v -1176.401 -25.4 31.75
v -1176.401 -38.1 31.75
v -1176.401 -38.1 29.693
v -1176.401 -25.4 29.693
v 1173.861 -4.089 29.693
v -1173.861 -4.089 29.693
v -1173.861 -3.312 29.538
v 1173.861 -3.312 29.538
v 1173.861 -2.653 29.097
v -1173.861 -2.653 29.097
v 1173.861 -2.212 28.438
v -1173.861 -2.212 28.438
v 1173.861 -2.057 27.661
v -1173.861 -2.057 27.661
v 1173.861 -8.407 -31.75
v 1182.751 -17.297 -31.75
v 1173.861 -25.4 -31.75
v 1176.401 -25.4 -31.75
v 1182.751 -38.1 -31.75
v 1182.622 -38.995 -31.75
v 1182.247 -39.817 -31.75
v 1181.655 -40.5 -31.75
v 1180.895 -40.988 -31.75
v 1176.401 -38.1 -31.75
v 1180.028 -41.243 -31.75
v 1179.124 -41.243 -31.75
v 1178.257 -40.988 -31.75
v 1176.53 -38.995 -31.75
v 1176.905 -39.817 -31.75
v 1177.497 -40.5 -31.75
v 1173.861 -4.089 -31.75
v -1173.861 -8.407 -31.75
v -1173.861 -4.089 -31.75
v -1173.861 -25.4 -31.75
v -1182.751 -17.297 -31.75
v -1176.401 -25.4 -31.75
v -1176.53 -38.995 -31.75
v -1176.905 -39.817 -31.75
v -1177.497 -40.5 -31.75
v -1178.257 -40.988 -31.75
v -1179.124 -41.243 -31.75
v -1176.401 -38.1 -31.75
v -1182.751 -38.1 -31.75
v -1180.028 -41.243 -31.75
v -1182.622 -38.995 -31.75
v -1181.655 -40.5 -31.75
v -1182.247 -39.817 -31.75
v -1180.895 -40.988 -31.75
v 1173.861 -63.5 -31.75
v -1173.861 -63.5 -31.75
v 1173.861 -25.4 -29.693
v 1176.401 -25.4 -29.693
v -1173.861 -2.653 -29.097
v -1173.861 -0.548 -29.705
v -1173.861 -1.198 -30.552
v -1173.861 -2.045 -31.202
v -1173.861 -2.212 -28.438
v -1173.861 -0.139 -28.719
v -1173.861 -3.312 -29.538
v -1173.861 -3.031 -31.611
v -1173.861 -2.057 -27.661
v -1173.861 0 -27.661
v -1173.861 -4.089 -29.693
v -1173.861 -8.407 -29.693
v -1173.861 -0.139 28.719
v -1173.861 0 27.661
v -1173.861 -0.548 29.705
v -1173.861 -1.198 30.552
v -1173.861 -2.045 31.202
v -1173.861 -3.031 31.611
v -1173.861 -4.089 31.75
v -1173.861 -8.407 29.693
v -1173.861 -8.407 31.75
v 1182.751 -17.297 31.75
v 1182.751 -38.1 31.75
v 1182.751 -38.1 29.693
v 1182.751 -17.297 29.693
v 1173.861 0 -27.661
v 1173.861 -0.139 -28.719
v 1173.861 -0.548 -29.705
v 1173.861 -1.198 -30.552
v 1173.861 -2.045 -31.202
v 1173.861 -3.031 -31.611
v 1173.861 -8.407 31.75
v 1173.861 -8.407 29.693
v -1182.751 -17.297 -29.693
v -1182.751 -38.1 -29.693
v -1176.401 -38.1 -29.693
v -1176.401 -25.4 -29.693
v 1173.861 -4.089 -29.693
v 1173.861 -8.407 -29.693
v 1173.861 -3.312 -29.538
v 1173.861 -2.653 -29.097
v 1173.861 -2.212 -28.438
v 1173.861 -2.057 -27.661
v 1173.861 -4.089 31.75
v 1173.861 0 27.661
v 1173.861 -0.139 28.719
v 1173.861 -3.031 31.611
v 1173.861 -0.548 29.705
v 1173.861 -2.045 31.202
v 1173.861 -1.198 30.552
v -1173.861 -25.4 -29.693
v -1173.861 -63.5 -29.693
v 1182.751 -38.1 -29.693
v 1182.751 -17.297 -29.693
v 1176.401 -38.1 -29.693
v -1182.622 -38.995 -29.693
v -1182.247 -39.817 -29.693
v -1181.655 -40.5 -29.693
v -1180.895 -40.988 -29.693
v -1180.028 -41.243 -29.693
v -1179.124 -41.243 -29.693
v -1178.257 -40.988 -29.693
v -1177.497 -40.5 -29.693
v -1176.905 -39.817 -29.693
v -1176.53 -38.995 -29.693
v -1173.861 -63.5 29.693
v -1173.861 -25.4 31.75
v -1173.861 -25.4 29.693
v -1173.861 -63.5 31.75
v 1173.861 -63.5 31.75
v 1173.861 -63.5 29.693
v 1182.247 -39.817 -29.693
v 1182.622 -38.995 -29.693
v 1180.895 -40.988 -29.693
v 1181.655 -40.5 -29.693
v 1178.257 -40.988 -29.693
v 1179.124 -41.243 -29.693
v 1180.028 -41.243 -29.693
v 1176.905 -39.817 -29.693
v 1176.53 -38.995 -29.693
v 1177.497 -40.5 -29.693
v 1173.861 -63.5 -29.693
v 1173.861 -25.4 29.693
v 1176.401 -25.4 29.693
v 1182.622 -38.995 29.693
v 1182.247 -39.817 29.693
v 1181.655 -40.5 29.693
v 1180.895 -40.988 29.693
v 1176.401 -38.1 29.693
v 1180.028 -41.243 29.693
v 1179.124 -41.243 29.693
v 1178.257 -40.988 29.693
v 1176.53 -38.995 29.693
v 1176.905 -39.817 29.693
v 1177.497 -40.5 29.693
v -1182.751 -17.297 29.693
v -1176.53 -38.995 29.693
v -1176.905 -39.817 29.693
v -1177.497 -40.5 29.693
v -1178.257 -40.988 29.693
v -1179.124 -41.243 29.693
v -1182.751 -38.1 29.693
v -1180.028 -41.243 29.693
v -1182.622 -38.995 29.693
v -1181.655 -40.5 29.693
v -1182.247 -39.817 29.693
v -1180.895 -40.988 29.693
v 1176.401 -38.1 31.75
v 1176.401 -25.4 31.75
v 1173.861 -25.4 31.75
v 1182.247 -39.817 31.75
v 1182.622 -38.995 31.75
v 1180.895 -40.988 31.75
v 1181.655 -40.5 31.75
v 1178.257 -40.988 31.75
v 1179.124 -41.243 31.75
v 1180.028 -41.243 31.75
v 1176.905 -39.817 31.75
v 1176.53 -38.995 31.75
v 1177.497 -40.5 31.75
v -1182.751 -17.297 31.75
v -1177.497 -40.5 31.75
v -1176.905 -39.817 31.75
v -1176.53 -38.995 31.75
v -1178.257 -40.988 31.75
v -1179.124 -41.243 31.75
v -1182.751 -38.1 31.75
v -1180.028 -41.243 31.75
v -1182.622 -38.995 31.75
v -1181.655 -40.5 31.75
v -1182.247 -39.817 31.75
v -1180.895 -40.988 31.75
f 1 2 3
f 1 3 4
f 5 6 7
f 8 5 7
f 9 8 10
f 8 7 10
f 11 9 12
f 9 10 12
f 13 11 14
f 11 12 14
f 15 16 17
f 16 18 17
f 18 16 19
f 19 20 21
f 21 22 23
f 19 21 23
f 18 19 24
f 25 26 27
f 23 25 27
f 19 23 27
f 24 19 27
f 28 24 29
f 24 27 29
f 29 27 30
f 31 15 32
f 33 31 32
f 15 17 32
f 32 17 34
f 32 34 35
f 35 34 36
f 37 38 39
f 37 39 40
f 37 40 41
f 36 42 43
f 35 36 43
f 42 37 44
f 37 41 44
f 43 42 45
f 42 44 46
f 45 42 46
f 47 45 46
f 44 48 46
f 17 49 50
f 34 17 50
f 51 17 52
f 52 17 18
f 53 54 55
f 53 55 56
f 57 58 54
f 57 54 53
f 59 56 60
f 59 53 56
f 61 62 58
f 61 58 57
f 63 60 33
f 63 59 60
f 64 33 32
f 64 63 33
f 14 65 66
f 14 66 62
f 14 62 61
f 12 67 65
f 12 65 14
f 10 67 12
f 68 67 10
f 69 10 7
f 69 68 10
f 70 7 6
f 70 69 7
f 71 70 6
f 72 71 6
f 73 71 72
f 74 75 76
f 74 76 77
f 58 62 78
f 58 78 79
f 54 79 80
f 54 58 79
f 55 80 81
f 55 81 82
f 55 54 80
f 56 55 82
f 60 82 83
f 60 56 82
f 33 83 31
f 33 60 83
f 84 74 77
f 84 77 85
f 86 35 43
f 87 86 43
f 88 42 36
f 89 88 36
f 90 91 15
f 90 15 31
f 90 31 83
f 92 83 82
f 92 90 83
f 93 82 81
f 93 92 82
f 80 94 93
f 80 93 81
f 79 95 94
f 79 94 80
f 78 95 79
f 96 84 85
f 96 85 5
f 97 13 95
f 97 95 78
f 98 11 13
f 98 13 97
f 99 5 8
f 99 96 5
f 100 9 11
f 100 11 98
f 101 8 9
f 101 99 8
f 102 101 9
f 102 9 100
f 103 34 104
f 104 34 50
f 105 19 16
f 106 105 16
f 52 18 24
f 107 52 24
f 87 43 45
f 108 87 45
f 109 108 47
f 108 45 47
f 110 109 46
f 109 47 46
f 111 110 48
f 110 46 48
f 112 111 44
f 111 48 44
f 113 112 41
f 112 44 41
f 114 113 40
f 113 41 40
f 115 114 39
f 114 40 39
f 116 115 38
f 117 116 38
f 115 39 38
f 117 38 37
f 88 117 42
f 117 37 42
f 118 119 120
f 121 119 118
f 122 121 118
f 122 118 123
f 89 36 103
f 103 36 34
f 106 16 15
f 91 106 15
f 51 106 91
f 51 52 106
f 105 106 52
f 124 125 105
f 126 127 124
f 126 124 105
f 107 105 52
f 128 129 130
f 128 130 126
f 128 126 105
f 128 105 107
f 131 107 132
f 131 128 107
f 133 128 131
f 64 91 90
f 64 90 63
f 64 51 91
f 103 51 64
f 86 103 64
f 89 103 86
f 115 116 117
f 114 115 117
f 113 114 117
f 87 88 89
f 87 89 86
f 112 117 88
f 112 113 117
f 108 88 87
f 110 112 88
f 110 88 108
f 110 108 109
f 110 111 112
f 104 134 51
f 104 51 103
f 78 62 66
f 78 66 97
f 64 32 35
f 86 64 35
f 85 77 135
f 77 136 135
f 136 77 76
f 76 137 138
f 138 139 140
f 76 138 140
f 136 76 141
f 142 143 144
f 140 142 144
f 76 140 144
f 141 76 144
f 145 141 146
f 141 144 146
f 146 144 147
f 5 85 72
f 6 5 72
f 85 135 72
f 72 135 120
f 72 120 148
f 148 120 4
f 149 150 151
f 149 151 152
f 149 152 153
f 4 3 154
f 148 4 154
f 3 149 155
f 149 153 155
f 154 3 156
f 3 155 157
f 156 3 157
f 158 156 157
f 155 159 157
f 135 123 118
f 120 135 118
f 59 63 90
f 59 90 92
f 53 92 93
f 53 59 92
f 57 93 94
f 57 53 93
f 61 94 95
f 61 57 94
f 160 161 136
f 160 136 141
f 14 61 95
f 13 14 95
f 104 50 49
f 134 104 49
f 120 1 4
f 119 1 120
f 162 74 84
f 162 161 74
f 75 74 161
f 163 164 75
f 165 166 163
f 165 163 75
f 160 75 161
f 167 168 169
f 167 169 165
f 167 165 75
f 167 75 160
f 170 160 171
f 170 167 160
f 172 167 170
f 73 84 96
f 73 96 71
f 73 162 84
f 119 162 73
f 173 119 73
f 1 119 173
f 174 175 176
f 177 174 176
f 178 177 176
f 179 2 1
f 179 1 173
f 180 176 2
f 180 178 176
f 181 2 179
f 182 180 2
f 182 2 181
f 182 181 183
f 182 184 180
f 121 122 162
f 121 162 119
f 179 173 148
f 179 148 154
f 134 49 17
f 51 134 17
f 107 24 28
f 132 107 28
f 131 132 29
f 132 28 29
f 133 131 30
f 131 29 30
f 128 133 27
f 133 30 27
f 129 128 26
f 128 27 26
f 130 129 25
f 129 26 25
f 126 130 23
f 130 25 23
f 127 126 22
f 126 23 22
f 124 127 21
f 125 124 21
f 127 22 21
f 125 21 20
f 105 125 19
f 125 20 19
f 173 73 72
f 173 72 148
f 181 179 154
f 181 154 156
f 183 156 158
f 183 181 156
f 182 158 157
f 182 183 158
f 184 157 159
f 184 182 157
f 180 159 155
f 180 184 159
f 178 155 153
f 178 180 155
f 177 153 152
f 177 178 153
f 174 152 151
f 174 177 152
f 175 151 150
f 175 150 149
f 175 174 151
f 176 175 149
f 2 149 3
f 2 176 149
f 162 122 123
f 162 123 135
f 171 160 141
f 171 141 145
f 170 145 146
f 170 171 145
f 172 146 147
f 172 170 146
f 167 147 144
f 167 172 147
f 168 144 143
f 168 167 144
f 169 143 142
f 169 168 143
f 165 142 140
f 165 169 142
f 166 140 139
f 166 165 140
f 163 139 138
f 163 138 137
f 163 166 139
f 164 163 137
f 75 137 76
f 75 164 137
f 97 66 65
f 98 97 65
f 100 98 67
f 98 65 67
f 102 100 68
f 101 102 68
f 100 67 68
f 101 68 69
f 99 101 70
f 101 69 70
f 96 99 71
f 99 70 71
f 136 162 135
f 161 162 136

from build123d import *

# Parameters (mm, degrees)
SKETCH2_W                    = 2347.722
SKETCH2_H                    = 63.5
BASE_FLANGE1_DEPTH           = 2.0574
EDGE_FLANGE1_STRIP_W         = 12.2936
EDGE_FLANGE1_STRIP_H         = 2.0574
EDGE_FLANGE1_STRIP_CUT_DEPTH = 2347.722
EDGE_FLANGE1_DEPTH           = 2347.722
EDGE_FLANGE1_FLAT_DEPTH      = 2.0574


# Sheet-metal steps are written as plain solids
with BuildPart() as part:
    # Sketch2 → Base-Flange1 (new body)
    with BuildSketch(Plane(origin=(0, 0, 0), x_dir=(1, 0, 0), z_dir=(0, 1, 0))):
        Rectangle(SKETCH2_W, SKETCH2_H)
    extrude(amount=-BASE_FLANGE1_DEPTH)

    # Edge-Flange1 strip (across the edge) → Edge-Flange1 strip cut (cut)
    with BuildSketch(Plane(origin=(-1173.861, -2.0574, -31.75), x_dir=(0, 0, 1), z_dir=(1, 0, 0))):
        with Locations((-2.0574, -1.0287)):
            Rectangle(EDGE_FLANGE1_STRIP_W, EDGE_FLANGE1_STRIP_H)
    edge_flange1_strip_cut = extrude(amount=EDGE_FLANGE1_STRIP_CUT_DEPTH, mode=Mode.SUBTRACT)

    # Edge-Flange1 bend section (across the edge) → Edge-Flange1 (add)
    with BuildSketch(Plane(origin=(-1173.861, -2.0574, -31.75), x_dir=(0, 0, 1), z_dir=(1, 0, 0))):
        with BuildLine():
            Line((0, 2.032), (2.0574, 2.032))
            ThreePointArc((2.0574, 2.032), (2.652559021, 0.595159021), (4.0894, 0))
            Line((4.0894, 0), (4.0894, -2.0574))
            ThreePointArc((4.0894, -2.0574), (1.197757529, -0.859642471), (0, 2.032))
        make_face()
    edge_flange1 = extrude(amount=EDGE_FLANGE1_DEPTH)

    # Edge-Flange1 profile (on flange) → Edge-Flange1 flat (add)
    with BuildSketch(Plane(origin=(0, -2.0574, -31.75), x_dir=(-1, 0, 0), z_dir=(0, 0, 1))):
        with BuildLine():
            Line((1176.401, 36.0426), (1176.401, 23.3426))
            Line((1176.401, 23.3426), (1173.861, 23.3426))
            Line((1173.861, 23.3426), (1173.861, 61.4426))
            Line((1173.861, 61.4426), (-1173.861, 61.4426))
            Line((-1173.861, 61.4426), (-1173.861, 23.3426))
            Line((-1173.861, 23.3426), (-1176.401, 23.3426))
            Line((-1176.401, 23.3426), (-1176.401, 36.0426))
            ThreePointArc((-1176.401, 36.0426), (-1179.576, 39.2176), (-1182.751, 36.0426))
            Line((-1182.751, 36.0426), (-1182.751, 15.24))
            Line((-1182.751, 15.24), (-1173.861, 6.35))
            Line((-1173.861, 6.35), (-1173.861, 2.032))
            Line((-1173.861, 2.032), (1173.861, 2.032))
            Line((1173.861, 2.032), (1173.861, 6.35))
            Line((1173.861, 6.35), (1182.751, 15.24))
            Line((1182.751, 15.24), (1182.751, 36.0426))
            ThreePointArc((1182.751, 36.0426), (1179.576, 39.2176), (1176.401, 36.0426))
        make_face()
    edge_flange1_flat = extrude(amount=EDGE_FLANGE1_FLAT_DEPTH)

    # Mirror1: Edge-Flange1 strip cut, Edge-Flange1, Edge-Flange1 flat across plane
    add(edge_flange1_strip_cut.mirror(Plane.XY), mode=Mode.SUBTRACT)
    add(edge_flange1.mirror(Plane.XY))
    add(edge_flange1_flat.mirror(Plane.XY))


solid = part.part
